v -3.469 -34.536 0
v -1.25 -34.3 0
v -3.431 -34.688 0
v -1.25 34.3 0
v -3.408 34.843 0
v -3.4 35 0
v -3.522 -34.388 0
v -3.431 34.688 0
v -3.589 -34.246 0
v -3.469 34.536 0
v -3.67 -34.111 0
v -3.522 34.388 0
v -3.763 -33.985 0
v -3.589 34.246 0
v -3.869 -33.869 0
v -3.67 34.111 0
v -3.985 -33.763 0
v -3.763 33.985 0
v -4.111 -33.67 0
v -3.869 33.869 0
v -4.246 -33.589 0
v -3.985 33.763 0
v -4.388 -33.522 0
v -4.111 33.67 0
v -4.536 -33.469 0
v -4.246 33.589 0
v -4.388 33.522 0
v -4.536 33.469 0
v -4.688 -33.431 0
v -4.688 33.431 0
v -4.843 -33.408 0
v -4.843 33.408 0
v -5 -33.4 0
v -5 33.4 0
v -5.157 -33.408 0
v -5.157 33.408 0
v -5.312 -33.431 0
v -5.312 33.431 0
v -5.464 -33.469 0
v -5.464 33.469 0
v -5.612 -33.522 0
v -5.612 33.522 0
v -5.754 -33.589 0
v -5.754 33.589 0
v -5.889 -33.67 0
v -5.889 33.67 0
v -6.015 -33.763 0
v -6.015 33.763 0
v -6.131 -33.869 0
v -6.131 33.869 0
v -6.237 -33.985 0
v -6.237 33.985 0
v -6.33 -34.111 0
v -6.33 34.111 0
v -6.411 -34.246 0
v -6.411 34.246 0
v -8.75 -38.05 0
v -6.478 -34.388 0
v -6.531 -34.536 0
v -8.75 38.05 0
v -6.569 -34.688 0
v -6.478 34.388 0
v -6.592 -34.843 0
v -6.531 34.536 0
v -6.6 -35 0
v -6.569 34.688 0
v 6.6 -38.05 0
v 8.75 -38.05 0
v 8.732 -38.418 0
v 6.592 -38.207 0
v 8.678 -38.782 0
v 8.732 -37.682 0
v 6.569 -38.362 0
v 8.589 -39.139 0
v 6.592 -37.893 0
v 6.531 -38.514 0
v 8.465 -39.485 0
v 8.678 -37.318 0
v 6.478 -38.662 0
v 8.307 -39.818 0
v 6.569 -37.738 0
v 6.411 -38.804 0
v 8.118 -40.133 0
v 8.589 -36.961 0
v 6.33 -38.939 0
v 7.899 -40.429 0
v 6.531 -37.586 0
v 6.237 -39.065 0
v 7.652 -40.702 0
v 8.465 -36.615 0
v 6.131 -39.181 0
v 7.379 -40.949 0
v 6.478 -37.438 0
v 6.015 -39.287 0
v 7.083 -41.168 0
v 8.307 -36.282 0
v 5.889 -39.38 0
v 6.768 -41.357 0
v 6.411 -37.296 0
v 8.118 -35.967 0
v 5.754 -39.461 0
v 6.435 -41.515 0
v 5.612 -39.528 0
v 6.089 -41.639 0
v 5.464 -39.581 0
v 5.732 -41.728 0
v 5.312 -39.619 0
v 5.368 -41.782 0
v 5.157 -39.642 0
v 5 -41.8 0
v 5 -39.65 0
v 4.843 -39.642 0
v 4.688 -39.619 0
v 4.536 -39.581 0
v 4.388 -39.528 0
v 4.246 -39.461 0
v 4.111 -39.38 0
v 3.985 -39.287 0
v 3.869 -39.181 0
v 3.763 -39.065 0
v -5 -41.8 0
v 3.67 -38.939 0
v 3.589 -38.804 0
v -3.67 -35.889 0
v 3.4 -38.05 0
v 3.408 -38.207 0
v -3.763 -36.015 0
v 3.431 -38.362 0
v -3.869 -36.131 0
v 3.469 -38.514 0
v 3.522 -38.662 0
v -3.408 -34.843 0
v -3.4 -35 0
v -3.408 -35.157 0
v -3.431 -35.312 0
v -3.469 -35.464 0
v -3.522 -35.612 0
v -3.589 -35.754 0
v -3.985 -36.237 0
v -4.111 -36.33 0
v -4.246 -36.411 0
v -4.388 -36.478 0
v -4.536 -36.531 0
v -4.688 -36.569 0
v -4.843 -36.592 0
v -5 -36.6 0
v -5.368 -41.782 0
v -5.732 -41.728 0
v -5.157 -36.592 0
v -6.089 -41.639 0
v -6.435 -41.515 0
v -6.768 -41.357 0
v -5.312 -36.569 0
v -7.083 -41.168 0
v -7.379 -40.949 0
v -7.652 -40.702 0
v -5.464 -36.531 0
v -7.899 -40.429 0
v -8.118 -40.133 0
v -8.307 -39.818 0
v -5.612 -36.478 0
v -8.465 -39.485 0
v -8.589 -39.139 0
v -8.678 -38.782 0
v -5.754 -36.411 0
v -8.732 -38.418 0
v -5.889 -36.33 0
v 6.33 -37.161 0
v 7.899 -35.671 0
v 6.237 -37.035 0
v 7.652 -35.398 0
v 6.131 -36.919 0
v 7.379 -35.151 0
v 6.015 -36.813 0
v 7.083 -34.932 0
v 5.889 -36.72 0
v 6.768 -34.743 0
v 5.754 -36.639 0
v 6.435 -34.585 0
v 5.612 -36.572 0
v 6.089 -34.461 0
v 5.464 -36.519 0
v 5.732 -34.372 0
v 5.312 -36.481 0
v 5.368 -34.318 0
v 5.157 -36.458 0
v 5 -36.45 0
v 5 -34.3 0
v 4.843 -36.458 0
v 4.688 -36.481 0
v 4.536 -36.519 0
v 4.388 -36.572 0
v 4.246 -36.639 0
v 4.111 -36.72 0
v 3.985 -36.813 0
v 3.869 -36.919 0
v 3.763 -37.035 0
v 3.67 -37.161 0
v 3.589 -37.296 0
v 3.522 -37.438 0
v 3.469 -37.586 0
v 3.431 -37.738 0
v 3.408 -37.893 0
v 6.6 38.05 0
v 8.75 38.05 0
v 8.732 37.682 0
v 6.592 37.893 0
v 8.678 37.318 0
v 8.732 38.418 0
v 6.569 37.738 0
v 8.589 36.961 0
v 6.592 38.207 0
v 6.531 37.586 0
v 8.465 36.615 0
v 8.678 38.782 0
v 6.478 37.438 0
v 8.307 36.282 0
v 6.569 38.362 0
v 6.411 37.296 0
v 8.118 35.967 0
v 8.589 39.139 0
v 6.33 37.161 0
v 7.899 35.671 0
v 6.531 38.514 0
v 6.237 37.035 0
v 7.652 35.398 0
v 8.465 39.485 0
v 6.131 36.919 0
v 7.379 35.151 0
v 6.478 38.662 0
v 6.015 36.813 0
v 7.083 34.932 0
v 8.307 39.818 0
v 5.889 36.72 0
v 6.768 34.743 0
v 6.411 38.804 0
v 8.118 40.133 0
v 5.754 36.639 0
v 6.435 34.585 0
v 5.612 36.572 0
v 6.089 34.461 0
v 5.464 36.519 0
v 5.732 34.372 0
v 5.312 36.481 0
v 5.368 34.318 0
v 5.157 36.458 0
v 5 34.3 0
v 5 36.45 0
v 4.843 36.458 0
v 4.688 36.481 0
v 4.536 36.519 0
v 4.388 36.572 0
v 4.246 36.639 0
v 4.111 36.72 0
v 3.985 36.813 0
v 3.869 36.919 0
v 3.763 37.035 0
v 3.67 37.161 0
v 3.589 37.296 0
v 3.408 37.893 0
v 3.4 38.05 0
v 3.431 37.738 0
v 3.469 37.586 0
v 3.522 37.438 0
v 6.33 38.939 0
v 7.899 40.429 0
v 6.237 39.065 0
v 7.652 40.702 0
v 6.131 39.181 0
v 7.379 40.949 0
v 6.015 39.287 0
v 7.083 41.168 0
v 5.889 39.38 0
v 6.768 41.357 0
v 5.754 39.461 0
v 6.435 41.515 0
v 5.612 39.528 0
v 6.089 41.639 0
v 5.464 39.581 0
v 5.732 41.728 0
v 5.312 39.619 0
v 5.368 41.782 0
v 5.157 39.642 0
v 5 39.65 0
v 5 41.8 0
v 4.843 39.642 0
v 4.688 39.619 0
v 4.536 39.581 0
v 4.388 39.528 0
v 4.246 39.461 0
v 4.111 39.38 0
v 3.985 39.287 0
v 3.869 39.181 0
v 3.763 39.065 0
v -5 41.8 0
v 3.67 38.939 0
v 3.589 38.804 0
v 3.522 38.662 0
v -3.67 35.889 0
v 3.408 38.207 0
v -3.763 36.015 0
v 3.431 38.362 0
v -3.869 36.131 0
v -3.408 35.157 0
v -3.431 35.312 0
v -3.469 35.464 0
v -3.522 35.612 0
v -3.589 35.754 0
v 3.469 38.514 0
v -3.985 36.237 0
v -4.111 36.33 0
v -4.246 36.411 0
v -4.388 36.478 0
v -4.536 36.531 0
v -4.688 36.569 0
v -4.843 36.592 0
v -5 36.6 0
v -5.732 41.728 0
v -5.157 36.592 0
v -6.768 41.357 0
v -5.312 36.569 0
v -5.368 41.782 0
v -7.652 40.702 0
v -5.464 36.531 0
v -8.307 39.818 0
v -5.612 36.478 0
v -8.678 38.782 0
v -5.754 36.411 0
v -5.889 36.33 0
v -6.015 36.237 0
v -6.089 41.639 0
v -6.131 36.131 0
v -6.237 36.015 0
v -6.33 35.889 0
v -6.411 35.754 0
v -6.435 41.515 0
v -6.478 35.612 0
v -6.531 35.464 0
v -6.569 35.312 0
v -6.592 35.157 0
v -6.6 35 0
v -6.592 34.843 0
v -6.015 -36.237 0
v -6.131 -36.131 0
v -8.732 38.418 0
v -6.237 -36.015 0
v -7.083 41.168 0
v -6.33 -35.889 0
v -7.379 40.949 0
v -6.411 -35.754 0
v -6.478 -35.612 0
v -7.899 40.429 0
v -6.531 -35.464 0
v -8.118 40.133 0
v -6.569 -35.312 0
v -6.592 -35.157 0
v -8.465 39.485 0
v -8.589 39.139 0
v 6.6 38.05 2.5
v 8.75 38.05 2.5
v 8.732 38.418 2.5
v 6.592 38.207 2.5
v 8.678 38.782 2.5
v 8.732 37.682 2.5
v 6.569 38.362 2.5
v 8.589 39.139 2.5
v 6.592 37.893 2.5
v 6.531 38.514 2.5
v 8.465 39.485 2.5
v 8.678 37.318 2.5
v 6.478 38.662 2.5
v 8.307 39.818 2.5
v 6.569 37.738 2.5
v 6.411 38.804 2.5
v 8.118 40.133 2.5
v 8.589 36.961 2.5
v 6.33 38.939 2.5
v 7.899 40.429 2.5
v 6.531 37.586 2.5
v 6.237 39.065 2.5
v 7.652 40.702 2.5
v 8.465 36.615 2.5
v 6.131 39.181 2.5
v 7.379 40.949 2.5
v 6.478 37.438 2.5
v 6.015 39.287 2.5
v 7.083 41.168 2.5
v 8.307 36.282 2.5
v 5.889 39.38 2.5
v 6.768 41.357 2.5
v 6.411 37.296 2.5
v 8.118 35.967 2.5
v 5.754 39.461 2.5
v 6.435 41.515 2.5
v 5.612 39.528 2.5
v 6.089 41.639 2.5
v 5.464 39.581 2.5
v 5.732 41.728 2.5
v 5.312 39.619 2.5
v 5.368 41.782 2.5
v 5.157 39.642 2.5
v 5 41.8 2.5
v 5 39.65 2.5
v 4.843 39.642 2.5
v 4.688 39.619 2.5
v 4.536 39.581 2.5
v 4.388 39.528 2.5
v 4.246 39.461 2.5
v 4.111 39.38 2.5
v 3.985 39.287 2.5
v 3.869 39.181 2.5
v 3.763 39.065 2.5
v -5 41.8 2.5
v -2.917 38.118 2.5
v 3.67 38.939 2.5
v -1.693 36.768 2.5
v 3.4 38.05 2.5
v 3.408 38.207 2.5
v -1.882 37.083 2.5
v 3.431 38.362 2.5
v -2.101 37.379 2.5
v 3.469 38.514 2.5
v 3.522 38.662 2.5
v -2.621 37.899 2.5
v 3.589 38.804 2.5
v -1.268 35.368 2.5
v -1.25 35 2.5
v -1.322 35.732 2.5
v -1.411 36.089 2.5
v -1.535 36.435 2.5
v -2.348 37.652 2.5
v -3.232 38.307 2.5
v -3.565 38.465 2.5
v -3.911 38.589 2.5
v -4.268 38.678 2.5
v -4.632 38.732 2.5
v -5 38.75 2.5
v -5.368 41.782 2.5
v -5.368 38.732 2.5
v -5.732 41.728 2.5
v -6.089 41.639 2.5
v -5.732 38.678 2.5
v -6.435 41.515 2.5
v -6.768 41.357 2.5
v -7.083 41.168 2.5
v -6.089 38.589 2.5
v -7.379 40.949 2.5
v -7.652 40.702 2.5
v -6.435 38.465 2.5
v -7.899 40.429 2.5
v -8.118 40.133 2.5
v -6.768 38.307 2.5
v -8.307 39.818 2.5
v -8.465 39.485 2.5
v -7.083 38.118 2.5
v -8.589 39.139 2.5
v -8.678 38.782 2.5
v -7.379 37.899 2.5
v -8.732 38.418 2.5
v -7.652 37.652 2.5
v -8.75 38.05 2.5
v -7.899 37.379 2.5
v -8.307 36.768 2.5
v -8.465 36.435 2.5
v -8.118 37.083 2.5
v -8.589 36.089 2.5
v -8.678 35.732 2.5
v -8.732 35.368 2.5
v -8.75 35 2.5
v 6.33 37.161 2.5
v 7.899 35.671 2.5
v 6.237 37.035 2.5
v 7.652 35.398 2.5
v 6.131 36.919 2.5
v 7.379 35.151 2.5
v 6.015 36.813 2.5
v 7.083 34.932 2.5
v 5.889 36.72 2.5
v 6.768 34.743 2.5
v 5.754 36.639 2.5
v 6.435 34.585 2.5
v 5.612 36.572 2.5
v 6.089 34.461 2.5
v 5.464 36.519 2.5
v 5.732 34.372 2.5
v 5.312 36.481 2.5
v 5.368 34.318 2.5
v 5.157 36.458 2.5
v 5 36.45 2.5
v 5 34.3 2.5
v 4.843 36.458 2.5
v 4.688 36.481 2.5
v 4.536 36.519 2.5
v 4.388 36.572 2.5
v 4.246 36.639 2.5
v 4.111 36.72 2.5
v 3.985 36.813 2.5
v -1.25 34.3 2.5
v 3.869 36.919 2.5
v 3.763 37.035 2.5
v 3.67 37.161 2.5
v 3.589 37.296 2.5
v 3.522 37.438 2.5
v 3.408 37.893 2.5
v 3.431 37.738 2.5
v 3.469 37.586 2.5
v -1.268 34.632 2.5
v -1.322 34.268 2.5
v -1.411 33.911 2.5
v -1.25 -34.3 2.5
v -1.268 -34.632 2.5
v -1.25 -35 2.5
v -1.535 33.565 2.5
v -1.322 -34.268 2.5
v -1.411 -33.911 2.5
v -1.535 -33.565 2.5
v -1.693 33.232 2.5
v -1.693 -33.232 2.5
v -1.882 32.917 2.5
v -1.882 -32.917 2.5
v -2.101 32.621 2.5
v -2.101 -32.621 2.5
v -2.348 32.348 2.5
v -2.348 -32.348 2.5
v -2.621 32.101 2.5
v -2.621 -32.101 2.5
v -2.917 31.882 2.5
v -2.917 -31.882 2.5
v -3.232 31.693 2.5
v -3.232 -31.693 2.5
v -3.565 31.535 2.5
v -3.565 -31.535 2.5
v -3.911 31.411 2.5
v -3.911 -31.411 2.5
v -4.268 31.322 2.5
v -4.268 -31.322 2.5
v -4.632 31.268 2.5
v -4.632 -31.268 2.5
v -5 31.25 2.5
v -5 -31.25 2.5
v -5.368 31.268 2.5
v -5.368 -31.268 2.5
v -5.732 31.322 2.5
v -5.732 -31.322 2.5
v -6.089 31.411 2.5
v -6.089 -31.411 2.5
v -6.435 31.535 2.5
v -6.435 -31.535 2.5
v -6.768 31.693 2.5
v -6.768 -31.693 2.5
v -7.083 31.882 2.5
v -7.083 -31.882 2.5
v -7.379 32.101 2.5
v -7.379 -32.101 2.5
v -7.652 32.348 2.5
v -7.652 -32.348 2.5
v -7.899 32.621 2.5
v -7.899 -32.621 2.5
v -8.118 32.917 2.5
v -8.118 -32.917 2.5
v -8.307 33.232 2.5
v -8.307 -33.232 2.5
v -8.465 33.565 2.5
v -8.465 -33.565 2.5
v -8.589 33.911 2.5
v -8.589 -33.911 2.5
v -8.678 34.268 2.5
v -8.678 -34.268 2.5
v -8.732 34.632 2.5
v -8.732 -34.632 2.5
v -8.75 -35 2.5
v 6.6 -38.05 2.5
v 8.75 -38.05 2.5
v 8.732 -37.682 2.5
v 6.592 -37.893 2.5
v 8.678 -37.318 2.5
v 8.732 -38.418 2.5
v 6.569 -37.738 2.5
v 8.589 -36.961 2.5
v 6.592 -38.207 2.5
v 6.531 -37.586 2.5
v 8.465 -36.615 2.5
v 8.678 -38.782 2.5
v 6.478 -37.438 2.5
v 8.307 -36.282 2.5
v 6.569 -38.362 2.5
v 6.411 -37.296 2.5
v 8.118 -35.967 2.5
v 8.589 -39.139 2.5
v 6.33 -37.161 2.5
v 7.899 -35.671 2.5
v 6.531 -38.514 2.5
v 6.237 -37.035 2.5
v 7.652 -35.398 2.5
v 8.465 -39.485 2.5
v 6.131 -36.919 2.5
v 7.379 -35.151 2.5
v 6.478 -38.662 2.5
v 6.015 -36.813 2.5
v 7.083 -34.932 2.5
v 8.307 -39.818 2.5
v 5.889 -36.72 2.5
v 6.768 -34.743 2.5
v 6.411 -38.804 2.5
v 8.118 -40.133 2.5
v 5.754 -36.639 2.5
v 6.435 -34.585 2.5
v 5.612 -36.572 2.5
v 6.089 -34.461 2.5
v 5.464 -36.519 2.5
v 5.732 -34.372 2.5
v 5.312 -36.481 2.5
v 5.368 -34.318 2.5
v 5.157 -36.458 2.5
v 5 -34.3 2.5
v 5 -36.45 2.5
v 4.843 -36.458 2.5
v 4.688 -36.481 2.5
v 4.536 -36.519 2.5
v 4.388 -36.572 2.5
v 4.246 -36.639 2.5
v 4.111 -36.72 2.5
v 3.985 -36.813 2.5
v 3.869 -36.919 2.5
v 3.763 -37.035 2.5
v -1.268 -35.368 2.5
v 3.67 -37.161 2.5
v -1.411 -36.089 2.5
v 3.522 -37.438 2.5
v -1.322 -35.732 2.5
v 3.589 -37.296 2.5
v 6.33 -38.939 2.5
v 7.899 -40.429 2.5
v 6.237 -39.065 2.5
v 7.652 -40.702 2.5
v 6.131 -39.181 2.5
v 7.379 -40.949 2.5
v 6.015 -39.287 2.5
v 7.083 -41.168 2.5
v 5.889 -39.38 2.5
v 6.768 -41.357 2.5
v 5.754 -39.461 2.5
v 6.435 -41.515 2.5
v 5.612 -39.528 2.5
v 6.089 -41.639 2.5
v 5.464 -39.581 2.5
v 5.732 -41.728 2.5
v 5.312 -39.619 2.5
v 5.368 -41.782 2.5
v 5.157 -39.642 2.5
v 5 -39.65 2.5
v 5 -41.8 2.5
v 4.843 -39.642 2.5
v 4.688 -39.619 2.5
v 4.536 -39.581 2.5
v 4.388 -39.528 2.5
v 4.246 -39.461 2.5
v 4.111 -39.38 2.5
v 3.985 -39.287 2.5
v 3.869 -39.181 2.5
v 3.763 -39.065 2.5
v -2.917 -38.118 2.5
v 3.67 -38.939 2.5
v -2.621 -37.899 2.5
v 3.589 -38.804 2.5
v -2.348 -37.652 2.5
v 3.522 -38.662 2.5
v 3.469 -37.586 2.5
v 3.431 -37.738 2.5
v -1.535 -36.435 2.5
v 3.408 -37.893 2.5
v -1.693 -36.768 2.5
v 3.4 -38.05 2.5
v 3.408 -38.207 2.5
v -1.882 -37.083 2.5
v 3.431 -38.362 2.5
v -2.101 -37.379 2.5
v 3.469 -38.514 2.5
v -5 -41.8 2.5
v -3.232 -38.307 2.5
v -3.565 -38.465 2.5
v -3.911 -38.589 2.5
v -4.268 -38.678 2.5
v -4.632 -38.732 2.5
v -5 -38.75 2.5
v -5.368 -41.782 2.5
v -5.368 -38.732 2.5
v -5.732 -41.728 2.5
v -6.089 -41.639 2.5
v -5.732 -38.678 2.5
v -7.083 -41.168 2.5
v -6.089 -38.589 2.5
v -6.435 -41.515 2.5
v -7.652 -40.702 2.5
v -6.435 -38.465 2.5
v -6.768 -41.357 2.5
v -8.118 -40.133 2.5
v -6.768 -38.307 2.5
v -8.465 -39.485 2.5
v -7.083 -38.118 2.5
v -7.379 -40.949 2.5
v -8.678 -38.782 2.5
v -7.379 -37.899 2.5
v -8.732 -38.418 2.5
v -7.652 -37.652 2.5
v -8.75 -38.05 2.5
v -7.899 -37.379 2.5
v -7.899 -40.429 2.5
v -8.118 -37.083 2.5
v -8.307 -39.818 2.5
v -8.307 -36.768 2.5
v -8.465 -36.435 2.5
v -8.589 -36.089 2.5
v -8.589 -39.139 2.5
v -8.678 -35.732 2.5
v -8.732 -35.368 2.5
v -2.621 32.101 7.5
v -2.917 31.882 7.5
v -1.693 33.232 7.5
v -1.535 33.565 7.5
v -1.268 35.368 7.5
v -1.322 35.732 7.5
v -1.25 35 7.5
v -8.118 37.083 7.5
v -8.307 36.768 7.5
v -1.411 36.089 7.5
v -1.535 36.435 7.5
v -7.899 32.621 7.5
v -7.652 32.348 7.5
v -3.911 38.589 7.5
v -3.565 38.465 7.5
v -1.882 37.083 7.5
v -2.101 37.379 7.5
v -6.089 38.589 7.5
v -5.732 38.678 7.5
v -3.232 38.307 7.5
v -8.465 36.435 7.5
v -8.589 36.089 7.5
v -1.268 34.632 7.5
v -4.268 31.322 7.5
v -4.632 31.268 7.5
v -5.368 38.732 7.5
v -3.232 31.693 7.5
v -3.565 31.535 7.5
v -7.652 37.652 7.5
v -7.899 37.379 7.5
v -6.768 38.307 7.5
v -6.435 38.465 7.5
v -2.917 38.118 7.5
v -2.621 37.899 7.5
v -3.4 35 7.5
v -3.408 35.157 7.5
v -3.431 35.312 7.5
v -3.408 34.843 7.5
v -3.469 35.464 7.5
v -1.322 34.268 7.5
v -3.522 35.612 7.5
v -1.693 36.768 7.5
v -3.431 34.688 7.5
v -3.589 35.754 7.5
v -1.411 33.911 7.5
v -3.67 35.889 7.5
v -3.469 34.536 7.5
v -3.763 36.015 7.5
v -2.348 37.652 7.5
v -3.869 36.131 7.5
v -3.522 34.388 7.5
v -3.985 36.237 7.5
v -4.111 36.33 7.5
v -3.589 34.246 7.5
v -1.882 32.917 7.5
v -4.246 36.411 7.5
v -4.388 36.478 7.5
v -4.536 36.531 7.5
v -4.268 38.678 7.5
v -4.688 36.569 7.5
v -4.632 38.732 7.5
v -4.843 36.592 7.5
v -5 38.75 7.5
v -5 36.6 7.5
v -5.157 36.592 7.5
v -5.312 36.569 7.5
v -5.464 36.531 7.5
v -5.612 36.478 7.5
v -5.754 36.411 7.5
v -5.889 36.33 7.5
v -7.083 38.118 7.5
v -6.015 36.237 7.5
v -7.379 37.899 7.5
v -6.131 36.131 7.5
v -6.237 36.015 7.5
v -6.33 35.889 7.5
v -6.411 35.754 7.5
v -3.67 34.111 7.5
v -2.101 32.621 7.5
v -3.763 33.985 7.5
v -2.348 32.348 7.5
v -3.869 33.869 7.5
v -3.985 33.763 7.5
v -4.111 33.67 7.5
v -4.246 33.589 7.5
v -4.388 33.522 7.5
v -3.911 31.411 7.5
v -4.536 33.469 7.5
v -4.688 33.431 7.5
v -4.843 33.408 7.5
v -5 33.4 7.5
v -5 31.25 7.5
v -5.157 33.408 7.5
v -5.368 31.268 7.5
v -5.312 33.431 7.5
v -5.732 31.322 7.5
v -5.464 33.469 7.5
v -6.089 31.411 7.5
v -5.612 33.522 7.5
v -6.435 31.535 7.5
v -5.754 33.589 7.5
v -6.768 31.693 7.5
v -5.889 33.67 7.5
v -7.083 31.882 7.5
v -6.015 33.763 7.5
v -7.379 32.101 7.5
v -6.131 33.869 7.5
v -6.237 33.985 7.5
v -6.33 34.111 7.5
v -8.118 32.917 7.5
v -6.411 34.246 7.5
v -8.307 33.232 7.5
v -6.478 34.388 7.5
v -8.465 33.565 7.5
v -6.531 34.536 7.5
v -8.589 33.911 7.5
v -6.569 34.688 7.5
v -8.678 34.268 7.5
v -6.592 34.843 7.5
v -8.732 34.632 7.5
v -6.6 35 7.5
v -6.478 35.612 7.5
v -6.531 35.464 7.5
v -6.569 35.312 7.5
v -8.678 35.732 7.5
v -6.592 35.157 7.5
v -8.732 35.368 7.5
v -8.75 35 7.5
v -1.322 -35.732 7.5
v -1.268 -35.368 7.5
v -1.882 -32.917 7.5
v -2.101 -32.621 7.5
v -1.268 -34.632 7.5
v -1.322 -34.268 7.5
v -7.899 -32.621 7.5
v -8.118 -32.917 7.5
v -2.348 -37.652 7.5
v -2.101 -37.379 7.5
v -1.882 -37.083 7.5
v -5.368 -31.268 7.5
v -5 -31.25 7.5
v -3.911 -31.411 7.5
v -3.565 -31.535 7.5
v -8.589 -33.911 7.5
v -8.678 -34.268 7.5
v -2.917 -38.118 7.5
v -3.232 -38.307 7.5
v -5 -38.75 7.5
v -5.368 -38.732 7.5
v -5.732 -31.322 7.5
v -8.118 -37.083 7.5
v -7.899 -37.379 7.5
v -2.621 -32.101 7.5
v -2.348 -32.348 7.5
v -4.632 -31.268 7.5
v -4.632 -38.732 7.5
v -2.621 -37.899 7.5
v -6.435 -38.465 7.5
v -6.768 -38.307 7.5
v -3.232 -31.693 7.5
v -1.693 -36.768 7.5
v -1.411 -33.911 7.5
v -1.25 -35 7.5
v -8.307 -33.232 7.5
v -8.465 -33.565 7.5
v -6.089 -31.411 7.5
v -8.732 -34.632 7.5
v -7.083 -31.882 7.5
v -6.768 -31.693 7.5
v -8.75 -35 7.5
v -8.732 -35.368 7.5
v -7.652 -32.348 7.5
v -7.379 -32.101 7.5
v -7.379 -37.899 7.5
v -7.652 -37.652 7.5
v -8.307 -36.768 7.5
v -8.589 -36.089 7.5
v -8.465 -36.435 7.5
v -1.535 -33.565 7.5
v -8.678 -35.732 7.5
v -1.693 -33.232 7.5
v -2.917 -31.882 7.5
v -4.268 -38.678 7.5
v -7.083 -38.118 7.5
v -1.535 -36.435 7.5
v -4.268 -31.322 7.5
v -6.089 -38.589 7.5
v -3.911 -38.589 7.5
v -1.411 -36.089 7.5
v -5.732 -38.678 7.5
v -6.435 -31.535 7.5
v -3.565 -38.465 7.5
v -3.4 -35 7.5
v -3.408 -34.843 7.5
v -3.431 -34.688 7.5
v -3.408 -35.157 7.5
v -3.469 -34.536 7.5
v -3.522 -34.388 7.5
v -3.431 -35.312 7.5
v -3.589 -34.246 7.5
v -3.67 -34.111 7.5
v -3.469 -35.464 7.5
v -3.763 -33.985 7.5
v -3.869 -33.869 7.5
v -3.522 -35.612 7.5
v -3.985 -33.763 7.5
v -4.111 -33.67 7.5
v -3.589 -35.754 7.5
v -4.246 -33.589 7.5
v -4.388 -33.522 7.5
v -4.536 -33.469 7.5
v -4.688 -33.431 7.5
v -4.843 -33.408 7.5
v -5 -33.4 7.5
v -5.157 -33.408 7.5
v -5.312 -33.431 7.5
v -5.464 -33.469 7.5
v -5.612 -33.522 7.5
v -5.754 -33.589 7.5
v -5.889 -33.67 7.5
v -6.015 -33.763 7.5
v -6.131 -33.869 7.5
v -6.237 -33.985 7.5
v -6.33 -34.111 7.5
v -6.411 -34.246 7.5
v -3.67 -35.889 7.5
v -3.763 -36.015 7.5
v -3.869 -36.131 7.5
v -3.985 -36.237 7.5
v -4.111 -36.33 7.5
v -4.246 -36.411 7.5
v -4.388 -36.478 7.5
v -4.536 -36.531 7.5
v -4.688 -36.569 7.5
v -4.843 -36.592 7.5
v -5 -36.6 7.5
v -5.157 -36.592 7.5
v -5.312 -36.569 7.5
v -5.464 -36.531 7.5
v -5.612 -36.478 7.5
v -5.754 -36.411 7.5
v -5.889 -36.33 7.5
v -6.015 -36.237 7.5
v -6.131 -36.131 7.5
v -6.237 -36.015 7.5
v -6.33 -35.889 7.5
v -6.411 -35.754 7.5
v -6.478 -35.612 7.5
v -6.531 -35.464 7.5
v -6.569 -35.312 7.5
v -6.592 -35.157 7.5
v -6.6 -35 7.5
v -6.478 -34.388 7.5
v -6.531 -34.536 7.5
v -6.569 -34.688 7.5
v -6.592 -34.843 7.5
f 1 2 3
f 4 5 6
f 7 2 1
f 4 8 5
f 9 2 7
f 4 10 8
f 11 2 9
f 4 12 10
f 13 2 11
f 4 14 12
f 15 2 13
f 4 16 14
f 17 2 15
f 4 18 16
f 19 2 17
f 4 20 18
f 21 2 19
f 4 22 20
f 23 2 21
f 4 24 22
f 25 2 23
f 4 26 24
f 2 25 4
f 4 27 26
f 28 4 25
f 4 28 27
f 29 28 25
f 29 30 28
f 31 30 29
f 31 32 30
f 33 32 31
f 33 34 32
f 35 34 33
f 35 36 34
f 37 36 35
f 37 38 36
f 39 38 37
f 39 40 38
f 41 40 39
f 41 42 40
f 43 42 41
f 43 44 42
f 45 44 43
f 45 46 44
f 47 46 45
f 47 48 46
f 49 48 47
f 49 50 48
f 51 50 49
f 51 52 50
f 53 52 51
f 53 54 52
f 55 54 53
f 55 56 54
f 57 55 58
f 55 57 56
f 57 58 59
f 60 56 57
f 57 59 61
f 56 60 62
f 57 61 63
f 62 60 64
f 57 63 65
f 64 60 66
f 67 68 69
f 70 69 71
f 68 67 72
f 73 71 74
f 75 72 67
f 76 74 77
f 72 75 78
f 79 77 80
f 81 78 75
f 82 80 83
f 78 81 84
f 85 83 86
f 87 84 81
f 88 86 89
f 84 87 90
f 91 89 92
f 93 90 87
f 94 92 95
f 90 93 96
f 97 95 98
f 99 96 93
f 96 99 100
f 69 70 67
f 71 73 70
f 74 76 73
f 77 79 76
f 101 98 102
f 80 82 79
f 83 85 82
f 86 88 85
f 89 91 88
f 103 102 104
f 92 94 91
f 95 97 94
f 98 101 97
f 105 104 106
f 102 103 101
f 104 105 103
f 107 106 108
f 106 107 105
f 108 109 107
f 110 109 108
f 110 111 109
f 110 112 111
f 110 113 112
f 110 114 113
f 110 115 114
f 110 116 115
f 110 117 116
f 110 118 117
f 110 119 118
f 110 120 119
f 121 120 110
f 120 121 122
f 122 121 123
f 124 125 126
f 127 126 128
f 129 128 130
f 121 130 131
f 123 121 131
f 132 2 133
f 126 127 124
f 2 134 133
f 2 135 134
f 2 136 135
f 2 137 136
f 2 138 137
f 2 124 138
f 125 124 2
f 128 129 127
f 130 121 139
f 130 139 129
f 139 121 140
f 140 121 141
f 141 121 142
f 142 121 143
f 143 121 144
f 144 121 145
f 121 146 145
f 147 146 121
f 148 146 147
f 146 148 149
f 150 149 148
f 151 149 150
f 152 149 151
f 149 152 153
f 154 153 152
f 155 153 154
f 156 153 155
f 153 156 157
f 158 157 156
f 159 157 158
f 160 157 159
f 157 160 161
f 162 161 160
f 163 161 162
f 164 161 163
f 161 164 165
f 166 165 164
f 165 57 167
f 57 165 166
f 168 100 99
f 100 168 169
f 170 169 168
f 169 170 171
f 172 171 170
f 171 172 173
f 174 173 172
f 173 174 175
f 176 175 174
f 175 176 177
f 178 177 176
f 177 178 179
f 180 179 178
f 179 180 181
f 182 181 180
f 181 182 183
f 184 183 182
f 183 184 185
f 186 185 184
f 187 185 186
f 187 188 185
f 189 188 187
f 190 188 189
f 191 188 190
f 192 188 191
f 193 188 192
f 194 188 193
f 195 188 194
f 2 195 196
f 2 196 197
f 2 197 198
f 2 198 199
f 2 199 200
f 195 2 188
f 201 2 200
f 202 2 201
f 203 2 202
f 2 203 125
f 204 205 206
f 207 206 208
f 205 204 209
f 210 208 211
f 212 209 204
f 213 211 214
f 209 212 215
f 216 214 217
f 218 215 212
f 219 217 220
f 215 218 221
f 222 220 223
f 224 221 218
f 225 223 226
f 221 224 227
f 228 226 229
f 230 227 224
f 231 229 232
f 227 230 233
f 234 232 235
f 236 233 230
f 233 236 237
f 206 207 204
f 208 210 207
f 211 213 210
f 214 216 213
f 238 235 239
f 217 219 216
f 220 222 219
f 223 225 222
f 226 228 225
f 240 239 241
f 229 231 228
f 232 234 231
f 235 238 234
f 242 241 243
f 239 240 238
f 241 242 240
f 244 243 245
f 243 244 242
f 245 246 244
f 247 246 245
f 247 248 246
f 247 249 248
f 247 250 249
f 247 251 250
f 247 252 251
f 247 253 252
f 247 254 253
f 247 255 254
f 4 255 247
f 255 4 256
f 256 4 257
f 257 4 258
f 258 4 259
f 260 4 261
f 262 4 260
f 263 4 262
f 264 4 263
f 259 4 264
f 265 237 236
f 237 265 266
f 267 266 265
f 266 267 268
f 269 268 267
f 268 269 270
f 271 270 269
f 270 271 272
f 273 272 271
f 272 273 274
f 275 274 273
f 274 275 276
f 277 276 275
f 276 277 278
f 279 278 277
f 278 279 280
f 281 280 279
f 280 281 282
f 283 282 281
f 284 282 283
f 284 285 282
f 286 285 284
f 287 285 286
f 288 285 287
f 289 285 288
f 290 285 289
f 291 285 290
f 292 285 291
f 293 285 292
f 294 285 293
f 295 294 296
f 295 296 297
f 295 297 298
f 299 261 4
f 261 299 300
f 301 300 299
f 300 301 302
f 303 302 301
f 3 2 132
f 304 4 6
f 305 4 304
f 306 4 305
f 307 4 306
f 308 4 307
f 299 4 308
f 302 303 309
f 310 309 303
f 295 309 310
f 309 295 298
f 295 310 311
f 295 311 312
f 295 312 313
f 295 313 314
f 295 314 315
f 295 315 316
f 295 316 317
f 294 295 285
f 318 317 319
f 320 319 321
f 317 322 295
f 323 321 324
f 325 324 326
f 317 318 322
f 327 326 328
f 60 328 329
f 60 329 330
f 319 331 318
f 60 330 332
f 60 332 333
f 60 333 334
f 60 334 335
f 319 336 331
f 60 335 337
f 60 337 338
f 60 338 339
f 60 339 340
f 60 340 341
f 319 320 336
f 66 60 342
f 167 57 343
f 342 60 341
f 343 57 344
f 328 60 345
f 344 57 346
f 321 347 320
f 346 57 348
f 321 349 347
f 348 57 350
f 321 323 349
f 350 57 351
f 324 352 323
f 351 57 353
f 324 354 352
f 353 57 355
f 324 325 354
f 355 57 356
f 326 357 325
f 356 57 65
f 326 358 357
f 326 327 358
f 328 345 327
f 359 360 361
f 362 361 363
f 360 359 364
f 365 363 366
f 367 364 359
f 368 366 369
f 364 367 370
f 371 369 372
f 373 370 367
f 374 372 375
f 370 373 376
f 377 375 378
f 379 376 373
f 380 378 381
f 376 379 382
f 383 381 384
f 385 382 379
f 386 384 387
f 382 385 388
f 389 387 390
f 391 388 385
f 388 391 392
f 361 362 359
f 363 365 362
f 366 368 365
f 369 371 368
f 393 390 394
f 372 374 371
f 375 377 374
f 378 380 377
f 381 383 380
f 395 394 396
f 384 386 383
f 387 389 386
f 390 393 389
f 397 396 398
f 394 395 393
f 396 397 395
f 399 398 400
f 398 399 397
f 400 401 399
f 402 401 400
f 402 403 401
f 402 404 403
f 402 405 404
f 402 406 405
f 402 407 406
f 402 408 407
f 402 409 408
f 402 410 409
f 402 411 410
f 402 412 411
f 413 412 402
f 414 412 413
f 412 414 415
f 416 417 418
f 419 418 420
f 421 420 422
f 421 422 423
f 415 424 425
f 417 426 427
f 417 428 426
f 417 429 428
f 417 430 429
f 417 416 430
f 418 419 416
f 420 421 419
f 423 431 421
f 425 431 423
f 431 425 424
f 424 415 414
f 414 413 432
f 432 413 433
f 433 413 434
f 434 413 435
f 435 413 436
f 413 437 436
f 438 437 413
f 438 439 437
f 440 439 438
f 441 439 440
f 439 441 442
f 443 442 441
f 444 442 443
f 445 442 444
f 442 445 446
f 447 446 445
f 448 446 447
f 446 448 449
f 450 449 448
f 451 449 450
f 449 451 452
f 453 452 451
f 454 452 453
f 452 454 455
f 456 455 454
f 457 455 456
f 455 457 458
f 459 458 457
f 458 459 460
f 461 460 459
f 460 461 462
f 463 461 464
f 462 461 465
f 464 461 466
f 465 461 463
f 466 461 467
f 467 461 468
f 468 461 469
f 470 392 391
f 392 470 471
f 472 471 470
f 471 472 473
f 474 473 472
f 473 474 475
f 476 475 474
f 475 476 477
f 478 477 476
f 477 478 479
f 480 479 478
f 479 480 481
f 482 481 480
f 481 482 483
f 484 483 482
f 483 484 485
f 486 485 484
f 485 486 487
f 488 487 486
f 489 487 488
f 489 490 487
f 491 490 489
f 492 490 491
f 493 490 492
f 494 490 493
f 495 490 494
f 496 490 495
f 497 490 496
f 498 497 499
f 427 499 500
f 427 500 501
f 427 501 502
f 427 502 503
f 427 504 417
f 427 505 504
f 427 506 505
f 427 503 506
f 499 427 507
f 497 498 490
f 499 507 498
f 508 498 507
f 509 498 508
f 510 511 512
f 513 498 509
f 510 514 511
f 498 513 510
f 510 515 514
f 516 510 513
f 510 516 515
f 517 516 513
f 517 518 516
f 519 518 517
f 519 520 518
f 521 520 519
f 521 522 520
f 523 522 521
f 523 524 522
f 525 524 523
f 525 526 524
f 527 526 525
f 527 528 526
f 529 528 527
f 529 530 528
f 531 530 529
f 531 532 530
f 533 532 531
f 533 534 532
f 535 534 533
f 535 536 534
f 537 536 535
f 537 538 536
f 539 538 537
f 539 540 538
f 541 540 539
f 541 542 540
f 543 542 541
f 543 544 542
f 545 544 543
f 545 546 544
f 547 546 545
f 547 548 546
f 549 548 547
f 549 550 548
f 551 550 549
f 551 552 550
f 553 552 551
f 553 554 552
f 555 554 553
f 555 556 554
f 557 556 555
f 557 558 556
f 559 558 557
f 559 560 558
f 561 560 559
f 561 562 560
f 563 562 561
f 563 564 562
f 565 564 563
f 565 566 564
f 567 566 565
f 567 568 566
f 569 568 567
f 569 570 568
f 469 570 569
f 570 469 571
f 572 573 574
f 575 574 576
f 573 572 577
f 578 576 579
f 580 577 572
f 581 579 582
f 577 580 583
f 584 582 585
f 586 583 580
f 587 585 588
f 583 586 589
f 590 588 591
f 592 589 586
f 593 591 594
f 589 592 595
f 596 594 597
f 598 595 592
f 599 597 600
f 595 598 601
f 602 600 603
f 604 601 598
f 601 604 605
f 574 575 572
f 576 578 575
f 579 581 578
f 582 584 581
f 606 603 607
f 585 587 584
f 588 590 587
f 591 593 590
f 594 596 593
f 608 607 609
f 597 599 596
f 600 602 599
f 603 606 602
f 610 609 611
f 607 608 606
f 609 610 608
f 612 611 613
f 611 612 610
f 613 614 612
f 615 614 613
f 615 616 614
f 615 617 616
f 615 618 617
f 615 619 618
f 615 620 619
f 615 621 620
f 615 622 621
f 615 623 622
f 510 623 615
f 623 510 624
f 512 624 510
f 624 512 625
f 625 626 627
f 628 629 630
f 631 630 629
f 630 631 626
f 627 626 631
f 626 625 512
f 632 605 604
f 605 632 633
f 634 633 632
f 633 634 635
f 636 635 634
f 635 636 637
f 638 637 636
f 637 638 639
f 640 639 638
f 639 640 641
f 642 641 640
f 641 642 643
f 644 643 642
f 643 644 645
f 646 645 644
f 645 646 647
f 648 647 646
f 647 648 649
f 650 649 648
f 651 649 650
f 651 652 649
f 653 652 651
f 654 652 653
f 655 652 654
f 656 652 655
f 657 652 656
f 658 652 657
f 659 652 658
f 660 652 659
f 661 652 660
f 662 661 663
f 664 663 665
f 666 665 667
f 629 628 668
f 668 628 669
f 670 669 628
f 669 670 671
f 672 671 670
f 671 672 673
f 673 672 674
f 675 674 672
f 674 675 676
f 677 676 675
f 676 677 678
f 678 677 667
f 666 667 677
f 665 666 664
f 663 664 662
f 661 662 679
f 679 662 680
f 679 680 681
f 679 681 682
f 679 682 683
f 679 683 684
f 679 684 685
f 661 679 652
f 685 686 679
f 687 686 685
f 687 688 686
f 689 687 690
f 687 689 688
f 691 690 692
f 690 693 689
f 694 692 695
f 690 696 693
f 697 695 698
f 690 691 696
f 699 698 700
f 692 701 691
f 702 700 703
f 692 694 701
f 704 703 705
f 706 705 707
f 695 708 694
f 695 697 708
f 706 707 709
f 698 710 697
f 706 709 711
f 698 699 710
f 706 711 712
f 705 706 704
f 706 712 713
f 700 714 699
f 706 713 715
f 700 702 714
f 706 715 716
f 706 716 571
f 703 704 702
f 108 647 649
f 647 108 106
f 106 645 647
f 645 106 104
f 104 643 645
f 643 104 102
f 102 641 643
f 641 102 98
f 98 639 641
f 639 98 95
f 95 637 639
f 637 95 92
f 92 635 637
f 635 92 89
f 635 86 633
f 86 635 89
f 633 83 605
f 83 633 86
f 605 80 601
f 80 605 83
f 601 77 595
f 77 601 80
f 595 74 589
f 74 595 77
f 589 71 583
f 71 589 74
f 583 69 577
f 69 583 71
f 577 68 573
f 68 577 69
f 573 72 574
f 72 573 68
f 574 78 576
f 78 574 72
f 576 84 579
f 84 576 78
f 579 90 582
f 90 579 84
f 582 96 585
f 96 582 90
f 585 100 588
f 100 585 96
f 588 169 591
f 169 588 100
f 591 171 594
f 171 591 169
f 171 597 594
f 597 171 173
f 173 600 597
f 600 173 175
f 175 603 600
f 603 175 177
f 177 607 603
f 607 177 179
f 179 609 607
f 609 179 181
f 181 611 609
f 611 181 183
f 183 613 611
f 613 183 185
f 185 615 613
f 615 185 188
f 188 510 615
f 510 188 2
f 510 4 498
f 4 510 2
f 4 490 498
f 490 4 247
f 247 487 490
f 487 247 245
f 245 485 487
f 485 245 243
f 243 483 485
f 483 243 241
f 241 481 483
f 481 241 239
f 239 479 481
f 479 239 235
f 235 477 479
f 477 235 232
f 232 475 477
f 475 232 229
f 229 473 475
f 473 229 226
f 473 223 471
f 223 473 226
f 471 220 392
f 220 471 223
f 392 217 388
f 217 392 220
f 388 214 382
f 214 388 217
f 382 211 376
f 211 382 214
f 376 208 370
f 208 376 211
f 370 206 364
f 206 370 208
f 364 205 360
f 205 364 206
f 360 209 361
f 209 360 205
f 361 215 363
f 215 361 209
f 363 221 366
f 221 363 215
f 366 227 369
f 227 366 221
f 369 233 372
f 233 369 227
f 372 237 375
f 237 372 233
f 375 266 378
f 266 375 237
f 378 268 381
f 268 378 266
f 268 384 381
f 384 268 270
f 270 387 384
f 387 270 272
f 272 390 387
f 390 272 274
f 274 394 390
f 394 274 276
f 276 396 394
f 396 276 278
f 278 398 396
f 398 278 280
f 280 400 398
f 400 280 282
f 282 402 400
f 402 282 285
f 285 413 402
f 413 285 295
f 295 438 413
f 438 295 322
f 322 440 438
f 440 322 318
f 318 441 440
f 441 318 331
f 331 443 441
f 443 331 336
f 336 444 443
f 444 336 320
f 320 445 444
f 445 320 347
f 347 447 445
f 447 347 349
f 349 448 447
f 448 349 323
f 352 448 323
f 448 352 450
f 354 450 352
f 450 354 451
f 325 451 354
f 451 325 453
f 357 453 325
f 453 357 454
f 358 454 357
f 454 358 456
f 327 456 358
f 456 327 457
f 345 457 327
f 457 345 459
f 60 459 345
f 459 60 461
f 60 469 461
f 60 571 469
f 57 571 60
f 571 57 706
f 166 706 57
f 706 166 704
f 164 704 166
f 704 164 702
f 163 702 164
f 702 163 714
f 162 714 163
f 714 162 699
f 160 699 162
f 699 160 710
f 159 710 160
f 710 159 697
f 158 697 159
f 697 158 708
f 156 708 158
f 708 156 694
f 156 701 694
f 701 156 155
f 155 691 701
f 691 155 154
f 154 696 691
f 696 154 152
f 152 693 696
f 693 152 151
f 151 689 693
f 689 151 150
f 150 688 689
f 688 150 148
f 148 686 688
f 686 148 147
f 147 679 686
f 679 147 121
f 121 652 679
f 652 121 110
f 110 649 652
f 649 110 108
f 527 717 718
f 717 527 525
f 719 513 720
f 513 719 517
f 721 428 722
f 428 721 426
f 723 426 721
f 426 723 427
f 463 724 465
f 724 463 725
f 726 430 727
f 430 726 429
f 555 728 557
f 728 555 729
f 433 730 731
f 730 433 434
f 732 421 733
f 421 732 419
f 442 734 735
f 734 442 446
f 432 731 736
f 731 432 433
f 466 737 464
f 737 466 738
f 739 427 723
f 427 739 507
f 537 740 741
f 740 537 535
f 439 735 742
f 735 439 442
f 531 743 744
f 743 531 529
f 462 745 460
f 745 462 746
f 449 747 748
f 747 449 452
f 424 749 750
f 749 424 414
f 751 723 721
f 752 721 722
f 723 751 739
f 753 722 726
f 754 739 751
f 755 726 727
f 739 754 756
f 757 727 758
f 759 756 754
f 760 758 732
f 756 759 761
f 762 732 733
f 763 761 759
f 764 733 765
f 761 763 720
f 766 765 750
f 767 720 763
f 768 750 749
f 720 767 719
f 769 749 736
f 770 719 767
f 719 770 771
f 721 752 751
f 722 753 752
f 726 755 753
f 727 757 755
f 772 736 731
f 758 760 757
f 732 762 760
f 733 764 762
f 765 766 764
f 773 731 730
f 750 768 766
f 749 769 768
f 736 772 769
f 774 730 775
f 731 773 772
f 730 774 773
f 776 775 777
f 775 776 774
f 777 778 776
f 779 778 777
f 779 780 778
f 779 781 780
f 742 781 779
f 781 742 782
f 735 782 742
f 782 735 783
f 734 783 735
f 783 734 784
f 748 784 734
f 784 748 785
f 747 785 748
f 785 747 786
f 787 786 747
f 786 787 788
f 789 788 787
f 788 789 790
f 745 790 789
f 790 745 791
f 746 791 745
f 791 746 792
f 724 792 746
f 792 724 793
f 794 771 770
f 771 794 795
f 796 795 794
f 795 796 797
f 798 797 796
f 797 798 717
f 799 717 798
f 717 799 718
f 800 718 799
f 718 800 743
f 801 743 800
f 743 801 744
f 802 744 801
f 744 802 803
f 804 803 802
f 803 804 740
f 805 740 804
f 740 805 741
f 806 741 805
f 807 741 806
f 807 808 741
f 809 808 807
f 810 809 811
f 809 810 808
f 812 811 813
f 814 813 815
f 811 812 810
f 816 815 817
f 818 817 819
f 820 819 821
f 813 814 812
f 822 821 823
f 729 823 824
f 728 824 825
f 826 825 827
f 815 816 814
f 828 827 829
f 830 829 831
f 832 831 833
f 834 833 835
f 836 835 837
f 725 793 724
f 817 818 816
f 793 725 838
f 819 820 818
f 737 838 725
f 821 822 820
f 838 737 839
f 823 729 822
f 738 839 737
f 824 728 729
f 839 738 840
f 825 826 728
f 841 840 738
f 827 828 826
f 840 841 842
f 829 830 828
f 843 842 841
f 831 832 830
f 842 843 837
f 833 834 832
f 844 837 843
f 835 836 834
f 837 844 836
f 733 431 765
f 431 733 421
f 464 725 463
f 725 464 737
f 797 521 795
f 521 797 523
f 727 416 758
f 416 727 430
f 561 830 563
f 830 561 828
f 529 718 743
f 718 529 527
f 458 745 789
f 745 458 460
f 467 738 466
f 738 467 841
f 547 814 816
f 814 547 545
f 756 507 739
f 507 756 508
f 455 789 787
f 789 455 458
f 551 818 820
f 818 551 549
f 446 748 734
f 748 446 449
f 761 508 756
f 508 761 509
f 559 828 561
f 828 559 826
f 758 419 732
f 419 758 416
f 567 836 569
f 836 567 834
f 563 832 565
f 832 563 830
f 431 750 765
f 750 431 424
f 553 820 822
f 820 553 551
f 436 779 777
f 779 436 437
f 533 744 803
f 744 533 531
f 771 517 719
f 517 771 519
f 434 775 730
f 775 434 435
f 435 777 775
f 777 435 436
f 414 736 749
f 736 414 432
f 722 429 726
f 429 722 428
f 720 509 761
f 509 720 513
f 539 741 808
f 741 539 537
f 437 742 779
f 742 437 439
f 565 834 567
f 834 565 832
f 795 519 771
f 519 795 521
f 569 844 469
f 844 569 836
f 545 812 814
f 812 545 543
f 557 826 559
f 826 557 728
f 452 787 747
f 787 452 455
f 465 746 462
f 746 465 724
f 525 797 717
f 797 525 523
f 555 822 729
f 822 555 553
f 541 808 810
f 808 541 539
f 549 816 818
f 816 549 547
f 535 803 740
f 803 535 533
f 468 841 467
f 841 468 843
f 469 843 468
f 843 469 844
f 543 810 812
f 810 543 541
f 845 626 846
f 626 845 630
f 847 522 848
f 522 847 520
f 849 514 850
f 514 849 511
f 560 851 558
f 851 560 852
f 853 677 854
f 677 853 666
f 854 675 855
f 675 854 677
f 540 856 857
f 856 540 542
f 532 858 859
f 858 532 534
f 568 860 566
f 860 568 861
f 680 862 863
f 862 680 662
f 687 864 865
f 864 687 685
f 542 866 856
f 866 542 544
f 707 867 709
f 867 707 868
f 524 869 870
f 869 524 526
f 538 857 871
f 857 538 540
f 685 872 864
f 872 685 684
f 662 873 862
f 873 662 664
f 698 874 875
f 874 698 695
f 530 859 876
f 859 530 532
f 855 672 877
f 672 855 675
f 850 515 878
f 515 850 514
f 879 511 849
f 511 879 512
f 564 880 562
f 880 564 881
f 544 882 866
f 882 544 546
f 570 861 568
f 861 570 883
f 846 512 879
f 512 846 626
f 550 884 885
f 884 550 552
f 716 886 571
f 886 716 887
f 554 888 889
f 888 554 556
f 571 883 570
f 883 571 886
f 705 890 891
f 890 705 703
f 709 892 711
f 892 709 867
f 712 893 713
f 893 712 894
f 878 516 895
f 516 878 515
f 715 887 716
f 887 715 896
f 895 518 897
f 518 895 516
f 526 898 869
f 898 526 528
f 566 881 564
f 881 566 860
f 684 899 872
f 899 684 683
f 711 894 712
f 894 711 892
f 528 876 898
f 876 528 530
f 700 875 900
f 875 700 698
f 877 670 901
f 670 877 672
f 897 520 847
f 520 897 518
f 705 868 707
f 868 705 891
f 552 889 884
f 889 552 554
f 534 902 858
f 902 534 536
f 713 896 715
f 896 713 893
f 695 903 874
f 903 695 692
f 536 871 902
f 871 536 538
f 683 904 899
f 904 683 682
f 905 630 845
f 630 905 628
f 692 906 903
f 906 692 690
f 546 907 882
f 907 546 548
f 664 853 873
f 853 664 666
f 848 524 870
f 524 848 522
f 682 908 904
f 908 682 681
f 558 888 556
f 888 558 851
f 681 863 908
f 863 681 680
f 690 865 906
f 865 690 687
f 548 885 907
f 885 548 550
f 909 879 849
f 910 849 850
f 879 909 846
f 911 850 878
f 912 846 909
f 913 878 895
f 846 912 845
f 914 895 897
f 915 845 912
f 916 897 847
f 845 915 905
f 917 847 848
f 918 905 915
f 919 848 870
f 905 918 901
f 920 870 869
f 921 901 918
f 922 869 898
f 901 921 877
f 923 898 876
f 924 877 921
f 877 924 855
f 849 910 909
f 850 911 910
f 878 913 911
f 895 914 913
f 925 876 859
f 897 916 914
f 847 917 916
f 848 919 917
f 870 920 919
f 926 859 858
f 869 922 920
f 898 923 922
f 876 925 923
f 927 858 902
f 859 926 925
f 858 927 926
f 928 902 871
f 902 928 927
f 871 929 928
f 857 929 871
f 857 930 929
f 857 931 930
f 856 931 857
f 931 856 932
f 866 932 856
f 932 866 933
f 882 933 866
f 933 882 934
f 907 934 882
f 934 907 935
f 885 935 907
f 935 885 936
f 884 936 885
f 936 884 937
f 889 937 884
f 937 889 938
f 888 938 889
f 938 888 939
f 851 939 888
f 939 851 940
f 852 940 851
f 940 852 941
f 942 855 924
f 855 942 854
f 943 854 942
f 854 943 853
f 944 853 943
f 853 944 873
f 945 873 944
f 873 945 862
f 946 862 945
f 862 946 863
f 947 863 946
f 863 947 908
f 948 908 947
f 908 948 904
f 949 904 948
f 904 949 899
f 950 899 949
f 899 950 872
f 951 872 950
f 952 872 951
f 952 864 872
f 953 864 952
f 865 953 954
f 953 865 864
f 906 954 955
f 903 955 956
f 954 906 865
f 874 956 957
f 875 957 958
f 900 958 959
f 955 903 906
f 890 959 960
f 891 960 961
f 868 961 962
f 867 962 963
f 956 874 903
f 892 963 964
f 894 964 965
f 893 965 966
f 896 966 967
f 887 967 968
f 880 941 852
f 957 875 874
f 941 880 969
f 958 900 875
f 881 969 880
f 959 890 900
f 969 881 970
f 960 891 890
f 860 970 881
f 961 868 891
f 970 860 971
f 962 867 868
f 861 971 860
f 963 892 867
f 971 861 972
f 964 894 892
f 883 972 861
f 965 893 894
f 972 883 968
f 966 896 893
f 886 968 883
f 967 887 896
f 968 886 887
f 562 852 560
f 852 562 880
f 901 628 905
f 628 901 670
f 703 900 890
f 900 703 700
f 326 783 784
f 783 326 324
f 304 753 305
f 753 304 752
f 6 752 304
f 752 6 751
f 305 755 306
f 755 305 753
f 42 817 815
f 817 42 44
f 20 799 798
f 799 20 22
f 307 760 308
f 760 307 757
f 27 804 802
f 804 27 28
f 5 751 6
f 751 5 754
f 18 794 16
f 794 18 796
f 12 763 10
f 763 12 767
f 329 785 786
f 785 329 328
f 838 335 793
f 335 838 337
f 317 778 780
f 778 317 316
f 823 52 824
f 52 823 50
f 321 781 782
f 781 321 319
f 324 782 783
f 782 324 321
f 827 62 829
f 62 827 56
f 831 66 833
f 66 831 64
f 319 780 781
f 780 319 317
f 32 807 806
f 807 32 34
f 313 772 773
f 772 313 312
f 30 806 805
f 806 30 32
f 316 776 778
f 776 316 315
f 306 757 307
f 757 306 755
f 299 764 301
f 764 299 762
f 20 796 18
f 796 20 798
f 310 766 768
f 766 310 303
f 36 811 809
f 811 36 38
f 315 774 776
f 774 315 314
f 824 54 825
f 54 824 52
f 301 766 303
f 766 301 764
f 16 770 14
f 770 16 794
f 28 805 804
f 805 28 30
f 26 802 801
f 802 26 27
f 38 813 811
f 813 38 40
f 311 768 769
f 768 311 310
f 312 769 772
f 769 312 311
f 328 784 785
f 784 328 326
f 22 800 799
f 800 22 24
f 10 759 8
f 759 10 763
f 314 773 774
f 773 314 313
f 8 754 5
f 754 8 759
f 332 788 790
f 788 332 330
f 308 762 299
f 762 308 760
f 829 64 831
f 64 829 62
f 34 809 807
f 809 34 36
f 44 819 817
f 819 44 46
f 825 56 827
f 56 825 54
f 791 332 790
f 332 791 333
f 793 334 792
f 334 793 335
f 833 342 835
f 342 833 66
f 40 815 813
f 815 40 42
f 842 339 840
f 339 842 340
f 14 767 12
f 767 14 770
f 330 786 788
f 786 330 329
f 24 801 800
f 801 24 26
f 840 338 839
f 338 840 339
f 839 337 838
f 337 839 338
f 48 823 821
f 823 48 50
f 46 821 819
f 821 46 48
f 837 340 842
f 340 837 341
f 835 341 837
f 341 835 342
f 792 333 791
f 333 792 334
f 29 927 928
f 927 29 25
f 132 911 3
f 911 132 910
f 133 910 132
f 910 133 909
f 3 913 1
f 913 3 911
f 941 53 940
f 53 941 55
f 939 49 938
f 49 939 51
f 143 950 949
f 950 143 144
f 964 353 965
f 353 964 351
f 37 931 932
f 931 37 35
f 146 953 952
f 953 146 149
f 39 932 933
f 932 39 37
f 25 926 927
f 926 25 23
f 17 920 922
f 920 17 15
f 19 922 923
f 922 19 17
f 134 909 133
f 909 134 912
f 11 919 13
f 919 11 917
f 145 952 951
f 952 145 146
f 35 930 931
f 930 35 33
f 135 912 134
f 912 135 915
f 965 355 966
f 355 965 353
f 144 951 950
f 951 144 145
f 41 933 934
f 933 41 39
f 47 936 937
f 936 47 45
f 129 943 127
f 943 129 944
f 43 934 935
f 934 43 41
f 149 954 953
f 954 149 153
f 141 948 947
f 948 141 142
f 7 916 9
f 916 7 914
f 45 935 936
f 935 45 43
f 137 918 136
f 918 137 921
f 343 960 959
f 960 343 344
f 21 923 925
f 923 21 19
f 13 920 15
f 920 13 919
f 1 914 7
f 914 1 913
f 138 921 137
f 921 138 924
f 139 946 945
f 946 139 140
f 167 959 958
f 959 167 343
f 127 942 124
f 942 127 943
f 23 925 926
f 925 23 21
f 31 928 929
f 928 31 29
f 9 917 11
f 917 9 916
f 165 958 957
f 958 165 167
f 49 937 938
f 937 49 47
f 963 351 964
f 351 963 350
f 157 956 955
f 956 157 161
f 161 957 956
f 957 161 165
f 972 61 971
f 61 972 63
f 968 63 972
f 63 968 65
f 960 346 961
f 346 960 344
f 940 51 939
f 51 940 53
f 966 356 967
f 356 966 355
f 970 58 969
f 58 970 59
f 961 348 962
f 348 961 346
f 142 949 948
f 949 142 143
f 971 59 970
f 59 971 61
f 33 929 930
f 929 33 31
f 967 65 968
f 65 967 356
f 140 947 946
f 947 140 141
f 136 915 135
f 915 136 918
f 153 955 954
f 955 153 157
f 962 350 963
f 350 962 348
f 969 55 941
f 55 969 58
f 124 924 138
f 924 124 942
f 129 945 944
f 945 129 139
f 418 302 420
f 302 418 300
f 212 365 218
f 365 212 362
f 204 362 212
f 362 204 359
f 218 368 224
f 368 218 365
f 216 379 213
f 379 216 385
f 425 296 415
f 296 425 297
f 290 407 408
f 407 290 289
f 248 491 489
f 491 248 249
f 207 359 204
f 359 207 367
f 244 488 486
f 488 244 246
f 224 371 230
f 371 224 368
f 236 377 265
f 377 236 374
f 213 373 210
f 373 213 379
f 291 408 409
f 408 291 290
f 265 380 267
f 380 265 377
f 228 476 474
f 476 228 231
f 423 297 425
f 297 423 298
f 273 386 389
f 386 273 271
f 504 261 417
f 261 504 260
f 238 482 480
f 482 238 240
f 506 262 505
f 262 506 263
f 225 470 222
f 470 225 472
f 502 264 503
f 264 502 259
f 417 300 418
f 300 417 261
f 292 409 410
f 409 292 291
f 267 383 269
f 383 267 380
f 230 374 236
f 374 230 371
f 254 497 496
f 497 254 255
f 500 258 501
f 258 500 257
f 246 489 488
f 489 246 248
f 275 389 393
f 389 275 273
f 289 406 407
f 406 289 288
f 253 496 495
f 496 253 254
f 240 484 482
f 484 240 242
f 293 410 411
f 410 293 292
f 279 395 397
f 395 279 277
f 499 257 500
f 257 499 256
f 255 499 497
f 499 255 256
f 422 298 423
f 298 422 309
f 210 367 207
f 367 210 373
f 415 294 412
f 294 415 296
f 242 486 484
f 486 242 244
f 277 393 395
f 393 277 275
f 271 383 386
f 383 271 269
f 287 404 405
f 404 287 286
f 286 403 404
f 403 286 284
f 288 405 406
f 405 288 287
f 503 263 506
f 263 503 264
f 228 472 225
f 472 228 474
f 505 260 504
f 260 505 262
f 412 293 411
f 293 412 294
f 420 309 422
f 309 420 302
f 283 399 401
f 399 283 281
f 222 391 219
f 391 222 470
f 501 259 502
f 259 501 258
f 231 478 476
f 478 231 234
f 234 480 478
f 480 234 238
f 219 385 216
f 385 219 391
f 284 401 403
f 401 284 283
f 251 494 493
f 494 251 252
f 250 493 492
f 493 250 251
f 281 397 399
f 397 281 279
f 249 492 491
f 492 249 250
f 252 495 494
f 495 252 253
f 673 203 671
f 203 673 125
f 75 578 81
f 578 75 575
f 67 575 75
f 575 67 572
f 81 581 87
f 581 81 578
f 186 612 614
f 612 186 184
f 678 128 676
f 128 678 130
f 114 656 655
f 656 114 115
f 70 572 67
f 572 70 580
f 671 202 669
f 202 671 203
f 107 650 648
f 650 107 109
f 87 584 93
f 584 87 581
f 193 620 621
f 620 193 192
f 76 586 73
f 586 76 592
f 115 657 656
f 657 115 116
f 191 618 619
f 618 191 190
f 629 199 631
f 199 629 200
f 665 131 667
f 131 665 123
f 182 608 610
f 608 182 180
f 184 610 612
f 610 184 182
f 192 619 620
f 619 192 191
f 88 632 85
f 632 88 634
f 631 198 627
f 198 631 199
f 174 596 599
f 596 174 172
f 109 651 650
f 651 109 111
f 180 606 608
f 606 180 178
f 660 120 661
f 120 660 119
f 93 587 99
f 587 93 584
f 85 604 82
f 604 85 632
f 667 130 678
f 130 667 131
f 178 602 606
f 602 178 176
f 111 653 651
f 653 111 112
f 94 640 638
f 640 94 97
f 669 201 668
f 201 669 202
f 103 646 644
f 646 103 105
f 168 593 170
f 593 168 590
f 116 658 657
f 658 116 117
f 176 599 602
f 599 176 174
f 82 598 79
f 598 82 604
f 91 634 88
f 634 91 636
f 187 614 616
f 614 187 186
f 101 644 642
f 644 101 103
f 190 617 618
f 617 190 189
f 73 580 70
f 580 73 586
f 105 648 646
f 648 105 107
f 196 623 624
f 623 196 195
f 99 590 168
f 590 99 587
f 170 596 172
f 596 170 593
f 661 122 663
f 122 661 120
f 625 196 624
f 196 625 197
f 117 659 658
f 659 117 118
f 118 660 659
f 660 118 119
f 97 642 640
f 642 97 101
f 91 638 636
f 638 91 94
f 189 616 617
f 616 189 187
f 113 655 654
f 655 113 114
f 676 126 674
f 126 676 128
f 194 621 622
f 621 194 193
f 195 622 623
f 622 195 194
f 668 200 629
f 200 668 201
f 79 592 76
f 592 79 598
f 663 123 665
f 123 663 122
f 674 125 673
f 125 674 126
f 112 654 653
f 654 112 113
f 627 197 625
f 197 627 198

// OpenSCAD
// bracket for mounting bigtreetech skr 1.3 on cnc 3018 pro.
// print two.

$fn = $preview ? 32 : 64;

bracket_y = 76.10;
rail_y = 70.0;

pillar_r = 3.75;
pillar_h = 7.5;
wall = 2.5;
screw_r=1.6;

pos_x = 2*pillar_r+wall;

module section() {
    hull() {
        translate([-pos_x/2, bracket_y/2])
        circle(pillar_r);
        translate([-pos_x/2, -bracket_y/2])
        circle(pillar_r);
    }
    hull() {
        translate([-pos_x/2, bracket_y/2])
        circle(pillar_r);
        translate([pos_x/2, bracket_y/2])
        circle(pillar_r);
    }
    hull() {
        translate([-pos_x/2, -bracket_y/2])
        circle(pillar_r);
        translate([pos_x/2, -bracket_y/2])
        circle(pillar_r);
    }
}


module bracket() {
    difference() {
        bracket_body();
        bracket_holes();
    }
}

module bracket_body() {
    linear_extrude(wall)
    section();
    translate([-pos_x/2, rail_y/2])
    cylinder(r=pillar_r,h=pillar_h);
    translate([-pos_x/2, -rail_y/2])
    cylinder(r=pillar_r,h=pillar_h);
}


module bracket_holes() {
    translate([-pos_x/2, rail_y/2])
    cylinder(r=screw_r,h=3*pillar_h,center=true);
    translate([-pos_x/2, -rail_y/2])
    cylinder(r=screw_r,h=3*pillar_h,center=true);
    translate([pos_x/2, bracket_y/2])
    cylinder(r=screw_r,h=3*pillar_h,center=true);
    translate([pos_x/2, -bracket_y/2])
    cylinder(r=screw_r,h=3*pillar_h,center=true);
}

module rack_holes() {
}

//projection()
bracket();
// not truncated
